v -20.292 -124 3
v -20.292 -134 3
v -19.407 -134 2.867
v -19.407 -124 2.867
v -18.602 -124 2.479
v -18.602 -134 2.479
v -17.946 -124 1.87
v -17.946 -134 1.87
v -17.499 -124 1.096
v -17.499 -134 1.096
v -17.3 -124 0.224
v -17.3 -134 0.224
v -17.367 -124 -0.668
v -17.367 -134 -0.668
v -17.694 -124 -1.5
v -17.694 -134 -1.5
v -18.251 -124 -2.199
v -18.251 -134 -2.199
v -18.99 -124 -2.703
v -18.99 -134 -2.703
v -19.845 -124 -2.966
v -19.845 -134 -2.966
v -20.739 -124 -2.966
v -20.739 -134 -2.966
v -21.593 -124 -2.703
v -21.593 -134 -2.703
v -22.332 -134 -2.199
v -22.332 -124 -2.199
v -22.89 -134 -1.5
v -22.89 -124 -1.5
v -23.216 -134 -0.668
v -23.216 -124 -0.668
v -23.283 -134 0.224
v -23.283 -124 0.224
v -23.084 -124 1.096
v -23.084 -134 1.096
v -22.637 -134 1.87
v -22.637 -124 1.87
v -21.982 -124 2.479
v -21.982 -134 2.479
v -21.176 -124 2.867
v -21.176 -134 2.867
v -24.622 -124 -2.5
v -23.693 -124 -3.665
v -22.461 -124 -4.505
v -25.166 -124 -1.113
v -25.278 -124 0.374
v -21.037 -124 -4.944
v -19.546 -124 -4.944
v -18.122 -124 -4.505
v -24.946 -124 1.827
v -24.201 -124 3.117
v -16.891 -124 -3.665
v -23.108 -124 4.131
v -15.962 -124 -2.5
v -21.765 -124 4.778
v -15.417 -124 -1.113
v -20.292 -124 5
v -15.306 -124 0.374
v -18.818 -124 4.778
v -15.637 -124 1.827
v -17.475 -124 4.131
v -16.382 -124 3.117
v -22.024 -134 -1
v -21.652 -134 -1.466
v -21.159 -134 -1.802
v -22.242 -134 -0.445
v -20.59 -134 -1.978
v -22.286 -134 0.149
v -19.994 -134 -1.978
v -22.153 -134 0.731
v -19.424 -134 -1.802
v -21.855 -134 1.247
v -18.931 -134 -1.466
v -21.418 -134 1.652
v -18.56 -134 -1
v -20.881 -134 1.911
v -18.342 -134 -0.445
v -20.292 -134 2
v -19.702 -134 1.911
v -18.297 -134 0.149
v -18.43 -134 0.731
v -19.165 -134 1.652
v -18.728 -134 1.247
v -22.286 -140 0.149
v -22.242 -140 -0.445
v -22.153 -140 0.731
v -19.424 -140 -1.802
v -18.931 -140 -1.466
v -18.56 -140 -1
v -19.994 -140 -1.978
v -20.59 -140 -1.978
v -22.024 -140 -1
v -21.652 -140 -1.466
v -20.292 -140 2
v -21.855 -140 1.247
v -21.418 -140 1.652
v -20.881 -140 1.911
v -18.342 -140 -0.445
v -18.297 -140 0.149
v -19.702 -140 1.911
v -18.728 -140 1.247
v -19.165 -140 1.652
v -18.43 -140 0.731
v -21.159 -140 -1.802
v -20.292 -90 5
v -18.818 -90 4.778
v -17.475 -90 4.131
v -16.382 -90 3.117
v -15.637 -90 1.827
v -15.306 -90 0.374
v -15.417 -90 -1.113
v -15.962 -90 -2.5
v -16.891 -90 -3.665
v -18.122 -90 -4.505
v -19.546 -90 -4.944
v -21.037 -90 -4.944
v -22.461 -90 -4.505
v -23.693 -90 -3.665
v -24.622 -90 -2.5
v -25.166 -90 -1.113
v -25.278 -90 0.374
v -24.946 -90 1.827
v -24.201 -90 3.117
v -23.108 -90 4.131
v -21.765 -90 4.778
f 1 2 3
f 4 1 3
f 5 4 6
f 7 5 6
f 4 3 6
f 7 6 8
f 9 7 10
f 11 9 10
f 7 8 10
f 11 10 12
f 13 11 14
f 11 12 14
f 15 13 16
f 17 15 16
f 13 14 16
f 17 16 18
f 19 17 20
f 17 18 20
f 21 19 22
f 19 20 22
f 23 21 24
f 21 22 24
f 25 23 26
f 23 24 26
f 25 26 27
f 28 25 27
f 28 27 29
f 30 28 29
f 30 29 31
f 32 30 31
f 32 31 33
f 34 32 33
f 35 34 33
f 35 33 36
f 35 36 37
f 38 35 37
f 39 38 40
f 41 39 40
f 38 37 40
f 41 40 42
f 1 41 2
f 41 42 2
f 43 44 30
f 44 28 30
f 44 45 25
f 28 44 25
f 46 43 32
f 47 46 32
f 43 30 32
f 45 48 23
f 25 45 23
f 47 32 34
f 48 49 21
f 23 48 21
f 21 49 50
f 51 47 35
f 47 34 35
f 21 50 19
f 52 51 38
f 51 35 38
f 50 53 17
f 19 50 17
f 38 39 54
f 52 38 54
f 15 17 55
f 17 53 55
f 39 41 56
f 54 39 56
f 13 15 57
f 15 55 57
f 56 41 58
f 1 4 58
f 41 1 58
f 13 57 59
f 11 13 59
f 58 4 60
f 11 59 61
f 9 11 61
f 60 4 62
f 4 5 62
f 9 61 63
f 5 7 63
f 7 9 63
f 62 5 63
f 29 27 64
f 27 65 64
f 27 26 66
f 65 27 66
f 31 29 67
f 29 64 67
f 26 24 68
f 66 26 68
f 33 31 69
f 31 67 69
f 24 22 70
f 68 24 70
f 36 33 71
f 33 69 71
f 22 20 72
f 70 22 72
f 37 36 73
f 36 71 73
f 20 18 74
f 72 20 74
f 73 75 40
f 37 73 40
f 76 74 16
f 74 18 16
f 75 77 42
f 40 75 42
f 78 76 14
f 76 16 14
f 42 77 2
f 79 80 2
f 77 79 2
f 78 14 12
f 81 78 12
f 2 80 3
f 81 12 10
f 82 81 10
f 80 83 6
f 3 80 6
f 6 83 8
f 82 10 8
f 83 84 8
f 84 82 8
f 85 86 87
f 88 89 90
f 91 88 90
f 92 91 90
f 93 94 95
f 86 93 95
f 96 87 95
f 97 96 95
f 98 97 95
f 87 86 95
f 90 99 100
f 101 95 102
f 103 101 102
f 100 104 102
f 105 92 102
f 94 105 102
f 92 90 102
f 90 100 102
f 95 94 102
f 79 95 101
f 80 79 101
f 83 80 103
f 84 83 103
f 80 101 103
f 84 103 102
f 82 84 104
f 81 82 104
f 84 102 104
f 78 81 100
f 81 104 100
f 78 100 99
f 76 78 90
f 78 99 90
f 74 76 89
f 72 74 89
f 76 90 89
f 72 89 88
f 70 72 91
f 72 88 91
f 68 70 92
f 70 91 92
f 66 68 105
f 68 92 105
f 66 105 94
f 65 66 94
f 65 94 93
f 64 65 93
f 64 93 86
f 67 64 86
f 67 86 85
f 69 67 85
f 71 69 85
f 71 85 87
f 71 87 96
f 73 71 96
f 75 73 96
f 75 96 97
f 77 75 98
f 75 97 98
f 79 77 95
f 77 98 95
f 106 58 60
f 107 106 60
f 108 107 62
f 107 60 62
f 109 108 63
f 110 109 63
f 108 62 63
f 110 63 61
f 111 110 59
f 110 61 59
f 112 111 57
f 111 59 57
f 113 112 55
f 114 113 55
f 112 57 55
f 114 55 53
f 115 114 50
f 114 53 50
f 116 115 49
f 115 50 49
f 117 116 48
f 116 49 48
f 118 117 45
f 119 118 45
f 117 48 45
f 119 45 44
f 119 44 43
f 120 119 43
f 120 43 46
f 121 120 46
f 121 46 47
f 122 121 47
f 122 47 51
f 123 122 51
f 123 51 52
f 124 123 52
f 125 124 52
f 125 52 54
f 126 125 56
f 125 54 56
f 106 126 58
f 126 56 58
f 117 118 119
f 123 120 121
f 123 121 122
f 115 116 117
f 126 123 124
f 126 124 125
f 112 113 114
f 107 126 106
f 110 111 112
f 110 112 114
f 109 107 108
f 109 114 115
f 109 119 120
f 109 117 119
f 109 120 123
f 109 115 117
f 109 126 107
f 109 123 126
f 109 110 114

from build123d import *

# Parameters (mm, degrees)
M4_THREAD_BLANK_SKETCH_R = 2
M4_THREAD_BLANK_DEPTH    = 6
LOCATING_SPIGOT_SKETCH_R = 3
LOCATING_SPIGOT_DEPTH    = 10
GUIDE_SHOULDER_SKETCH_R  = 5
GUIDE_SHOULDER_DEPTH     = 34


with BuildPart() as part:
    # M4 Thread Blank Sketch → M4 Thread Blank (new body)
    with BuildSketch(Plane(origin=(0, -140, 0), x_dir=(1, 0, 0), z_dir=(0, 1, 0))):
        with Locations(Location((-20.291651246, 0, 0), (0, 0, 270))):
            Circle(M4_THREAD_BLANK_SKETCH_R)
    extrude(amount=M4_THREAD_BLANK_DEPTH)

    # Locating Spigot Sketch → Locating Spigot (add)
    with BuildSketch(Plane(origin=(0, -134, 0), x_dir=(1, 0, 0), z_dir=(0, 1, 0))):
        with Locations(Location((-20.291651246, 0, 0), (0, 0, 270))):
            Circle(LOCATING_SPIGOT_SKETCH_R)
    extrude(amount=LOCATING_SPIGOT_DEPTH)

    # Guide Shoulder Sketch → Guide Shoulder (add)
    with BuildSketch(Plane(origin=(0, -124, 0), x_dir=(1, 0, 0), z_dir=(0, 1, 0))):
        with Locations(Location((-20.291651246, 0, 0), (0, 0, 270))):
            Circle(GUIDE_SHOULDER_SKETCH_R)
    extrude(amount=GUIDE_SHOULDER_DEPTH)


solid = part.part
